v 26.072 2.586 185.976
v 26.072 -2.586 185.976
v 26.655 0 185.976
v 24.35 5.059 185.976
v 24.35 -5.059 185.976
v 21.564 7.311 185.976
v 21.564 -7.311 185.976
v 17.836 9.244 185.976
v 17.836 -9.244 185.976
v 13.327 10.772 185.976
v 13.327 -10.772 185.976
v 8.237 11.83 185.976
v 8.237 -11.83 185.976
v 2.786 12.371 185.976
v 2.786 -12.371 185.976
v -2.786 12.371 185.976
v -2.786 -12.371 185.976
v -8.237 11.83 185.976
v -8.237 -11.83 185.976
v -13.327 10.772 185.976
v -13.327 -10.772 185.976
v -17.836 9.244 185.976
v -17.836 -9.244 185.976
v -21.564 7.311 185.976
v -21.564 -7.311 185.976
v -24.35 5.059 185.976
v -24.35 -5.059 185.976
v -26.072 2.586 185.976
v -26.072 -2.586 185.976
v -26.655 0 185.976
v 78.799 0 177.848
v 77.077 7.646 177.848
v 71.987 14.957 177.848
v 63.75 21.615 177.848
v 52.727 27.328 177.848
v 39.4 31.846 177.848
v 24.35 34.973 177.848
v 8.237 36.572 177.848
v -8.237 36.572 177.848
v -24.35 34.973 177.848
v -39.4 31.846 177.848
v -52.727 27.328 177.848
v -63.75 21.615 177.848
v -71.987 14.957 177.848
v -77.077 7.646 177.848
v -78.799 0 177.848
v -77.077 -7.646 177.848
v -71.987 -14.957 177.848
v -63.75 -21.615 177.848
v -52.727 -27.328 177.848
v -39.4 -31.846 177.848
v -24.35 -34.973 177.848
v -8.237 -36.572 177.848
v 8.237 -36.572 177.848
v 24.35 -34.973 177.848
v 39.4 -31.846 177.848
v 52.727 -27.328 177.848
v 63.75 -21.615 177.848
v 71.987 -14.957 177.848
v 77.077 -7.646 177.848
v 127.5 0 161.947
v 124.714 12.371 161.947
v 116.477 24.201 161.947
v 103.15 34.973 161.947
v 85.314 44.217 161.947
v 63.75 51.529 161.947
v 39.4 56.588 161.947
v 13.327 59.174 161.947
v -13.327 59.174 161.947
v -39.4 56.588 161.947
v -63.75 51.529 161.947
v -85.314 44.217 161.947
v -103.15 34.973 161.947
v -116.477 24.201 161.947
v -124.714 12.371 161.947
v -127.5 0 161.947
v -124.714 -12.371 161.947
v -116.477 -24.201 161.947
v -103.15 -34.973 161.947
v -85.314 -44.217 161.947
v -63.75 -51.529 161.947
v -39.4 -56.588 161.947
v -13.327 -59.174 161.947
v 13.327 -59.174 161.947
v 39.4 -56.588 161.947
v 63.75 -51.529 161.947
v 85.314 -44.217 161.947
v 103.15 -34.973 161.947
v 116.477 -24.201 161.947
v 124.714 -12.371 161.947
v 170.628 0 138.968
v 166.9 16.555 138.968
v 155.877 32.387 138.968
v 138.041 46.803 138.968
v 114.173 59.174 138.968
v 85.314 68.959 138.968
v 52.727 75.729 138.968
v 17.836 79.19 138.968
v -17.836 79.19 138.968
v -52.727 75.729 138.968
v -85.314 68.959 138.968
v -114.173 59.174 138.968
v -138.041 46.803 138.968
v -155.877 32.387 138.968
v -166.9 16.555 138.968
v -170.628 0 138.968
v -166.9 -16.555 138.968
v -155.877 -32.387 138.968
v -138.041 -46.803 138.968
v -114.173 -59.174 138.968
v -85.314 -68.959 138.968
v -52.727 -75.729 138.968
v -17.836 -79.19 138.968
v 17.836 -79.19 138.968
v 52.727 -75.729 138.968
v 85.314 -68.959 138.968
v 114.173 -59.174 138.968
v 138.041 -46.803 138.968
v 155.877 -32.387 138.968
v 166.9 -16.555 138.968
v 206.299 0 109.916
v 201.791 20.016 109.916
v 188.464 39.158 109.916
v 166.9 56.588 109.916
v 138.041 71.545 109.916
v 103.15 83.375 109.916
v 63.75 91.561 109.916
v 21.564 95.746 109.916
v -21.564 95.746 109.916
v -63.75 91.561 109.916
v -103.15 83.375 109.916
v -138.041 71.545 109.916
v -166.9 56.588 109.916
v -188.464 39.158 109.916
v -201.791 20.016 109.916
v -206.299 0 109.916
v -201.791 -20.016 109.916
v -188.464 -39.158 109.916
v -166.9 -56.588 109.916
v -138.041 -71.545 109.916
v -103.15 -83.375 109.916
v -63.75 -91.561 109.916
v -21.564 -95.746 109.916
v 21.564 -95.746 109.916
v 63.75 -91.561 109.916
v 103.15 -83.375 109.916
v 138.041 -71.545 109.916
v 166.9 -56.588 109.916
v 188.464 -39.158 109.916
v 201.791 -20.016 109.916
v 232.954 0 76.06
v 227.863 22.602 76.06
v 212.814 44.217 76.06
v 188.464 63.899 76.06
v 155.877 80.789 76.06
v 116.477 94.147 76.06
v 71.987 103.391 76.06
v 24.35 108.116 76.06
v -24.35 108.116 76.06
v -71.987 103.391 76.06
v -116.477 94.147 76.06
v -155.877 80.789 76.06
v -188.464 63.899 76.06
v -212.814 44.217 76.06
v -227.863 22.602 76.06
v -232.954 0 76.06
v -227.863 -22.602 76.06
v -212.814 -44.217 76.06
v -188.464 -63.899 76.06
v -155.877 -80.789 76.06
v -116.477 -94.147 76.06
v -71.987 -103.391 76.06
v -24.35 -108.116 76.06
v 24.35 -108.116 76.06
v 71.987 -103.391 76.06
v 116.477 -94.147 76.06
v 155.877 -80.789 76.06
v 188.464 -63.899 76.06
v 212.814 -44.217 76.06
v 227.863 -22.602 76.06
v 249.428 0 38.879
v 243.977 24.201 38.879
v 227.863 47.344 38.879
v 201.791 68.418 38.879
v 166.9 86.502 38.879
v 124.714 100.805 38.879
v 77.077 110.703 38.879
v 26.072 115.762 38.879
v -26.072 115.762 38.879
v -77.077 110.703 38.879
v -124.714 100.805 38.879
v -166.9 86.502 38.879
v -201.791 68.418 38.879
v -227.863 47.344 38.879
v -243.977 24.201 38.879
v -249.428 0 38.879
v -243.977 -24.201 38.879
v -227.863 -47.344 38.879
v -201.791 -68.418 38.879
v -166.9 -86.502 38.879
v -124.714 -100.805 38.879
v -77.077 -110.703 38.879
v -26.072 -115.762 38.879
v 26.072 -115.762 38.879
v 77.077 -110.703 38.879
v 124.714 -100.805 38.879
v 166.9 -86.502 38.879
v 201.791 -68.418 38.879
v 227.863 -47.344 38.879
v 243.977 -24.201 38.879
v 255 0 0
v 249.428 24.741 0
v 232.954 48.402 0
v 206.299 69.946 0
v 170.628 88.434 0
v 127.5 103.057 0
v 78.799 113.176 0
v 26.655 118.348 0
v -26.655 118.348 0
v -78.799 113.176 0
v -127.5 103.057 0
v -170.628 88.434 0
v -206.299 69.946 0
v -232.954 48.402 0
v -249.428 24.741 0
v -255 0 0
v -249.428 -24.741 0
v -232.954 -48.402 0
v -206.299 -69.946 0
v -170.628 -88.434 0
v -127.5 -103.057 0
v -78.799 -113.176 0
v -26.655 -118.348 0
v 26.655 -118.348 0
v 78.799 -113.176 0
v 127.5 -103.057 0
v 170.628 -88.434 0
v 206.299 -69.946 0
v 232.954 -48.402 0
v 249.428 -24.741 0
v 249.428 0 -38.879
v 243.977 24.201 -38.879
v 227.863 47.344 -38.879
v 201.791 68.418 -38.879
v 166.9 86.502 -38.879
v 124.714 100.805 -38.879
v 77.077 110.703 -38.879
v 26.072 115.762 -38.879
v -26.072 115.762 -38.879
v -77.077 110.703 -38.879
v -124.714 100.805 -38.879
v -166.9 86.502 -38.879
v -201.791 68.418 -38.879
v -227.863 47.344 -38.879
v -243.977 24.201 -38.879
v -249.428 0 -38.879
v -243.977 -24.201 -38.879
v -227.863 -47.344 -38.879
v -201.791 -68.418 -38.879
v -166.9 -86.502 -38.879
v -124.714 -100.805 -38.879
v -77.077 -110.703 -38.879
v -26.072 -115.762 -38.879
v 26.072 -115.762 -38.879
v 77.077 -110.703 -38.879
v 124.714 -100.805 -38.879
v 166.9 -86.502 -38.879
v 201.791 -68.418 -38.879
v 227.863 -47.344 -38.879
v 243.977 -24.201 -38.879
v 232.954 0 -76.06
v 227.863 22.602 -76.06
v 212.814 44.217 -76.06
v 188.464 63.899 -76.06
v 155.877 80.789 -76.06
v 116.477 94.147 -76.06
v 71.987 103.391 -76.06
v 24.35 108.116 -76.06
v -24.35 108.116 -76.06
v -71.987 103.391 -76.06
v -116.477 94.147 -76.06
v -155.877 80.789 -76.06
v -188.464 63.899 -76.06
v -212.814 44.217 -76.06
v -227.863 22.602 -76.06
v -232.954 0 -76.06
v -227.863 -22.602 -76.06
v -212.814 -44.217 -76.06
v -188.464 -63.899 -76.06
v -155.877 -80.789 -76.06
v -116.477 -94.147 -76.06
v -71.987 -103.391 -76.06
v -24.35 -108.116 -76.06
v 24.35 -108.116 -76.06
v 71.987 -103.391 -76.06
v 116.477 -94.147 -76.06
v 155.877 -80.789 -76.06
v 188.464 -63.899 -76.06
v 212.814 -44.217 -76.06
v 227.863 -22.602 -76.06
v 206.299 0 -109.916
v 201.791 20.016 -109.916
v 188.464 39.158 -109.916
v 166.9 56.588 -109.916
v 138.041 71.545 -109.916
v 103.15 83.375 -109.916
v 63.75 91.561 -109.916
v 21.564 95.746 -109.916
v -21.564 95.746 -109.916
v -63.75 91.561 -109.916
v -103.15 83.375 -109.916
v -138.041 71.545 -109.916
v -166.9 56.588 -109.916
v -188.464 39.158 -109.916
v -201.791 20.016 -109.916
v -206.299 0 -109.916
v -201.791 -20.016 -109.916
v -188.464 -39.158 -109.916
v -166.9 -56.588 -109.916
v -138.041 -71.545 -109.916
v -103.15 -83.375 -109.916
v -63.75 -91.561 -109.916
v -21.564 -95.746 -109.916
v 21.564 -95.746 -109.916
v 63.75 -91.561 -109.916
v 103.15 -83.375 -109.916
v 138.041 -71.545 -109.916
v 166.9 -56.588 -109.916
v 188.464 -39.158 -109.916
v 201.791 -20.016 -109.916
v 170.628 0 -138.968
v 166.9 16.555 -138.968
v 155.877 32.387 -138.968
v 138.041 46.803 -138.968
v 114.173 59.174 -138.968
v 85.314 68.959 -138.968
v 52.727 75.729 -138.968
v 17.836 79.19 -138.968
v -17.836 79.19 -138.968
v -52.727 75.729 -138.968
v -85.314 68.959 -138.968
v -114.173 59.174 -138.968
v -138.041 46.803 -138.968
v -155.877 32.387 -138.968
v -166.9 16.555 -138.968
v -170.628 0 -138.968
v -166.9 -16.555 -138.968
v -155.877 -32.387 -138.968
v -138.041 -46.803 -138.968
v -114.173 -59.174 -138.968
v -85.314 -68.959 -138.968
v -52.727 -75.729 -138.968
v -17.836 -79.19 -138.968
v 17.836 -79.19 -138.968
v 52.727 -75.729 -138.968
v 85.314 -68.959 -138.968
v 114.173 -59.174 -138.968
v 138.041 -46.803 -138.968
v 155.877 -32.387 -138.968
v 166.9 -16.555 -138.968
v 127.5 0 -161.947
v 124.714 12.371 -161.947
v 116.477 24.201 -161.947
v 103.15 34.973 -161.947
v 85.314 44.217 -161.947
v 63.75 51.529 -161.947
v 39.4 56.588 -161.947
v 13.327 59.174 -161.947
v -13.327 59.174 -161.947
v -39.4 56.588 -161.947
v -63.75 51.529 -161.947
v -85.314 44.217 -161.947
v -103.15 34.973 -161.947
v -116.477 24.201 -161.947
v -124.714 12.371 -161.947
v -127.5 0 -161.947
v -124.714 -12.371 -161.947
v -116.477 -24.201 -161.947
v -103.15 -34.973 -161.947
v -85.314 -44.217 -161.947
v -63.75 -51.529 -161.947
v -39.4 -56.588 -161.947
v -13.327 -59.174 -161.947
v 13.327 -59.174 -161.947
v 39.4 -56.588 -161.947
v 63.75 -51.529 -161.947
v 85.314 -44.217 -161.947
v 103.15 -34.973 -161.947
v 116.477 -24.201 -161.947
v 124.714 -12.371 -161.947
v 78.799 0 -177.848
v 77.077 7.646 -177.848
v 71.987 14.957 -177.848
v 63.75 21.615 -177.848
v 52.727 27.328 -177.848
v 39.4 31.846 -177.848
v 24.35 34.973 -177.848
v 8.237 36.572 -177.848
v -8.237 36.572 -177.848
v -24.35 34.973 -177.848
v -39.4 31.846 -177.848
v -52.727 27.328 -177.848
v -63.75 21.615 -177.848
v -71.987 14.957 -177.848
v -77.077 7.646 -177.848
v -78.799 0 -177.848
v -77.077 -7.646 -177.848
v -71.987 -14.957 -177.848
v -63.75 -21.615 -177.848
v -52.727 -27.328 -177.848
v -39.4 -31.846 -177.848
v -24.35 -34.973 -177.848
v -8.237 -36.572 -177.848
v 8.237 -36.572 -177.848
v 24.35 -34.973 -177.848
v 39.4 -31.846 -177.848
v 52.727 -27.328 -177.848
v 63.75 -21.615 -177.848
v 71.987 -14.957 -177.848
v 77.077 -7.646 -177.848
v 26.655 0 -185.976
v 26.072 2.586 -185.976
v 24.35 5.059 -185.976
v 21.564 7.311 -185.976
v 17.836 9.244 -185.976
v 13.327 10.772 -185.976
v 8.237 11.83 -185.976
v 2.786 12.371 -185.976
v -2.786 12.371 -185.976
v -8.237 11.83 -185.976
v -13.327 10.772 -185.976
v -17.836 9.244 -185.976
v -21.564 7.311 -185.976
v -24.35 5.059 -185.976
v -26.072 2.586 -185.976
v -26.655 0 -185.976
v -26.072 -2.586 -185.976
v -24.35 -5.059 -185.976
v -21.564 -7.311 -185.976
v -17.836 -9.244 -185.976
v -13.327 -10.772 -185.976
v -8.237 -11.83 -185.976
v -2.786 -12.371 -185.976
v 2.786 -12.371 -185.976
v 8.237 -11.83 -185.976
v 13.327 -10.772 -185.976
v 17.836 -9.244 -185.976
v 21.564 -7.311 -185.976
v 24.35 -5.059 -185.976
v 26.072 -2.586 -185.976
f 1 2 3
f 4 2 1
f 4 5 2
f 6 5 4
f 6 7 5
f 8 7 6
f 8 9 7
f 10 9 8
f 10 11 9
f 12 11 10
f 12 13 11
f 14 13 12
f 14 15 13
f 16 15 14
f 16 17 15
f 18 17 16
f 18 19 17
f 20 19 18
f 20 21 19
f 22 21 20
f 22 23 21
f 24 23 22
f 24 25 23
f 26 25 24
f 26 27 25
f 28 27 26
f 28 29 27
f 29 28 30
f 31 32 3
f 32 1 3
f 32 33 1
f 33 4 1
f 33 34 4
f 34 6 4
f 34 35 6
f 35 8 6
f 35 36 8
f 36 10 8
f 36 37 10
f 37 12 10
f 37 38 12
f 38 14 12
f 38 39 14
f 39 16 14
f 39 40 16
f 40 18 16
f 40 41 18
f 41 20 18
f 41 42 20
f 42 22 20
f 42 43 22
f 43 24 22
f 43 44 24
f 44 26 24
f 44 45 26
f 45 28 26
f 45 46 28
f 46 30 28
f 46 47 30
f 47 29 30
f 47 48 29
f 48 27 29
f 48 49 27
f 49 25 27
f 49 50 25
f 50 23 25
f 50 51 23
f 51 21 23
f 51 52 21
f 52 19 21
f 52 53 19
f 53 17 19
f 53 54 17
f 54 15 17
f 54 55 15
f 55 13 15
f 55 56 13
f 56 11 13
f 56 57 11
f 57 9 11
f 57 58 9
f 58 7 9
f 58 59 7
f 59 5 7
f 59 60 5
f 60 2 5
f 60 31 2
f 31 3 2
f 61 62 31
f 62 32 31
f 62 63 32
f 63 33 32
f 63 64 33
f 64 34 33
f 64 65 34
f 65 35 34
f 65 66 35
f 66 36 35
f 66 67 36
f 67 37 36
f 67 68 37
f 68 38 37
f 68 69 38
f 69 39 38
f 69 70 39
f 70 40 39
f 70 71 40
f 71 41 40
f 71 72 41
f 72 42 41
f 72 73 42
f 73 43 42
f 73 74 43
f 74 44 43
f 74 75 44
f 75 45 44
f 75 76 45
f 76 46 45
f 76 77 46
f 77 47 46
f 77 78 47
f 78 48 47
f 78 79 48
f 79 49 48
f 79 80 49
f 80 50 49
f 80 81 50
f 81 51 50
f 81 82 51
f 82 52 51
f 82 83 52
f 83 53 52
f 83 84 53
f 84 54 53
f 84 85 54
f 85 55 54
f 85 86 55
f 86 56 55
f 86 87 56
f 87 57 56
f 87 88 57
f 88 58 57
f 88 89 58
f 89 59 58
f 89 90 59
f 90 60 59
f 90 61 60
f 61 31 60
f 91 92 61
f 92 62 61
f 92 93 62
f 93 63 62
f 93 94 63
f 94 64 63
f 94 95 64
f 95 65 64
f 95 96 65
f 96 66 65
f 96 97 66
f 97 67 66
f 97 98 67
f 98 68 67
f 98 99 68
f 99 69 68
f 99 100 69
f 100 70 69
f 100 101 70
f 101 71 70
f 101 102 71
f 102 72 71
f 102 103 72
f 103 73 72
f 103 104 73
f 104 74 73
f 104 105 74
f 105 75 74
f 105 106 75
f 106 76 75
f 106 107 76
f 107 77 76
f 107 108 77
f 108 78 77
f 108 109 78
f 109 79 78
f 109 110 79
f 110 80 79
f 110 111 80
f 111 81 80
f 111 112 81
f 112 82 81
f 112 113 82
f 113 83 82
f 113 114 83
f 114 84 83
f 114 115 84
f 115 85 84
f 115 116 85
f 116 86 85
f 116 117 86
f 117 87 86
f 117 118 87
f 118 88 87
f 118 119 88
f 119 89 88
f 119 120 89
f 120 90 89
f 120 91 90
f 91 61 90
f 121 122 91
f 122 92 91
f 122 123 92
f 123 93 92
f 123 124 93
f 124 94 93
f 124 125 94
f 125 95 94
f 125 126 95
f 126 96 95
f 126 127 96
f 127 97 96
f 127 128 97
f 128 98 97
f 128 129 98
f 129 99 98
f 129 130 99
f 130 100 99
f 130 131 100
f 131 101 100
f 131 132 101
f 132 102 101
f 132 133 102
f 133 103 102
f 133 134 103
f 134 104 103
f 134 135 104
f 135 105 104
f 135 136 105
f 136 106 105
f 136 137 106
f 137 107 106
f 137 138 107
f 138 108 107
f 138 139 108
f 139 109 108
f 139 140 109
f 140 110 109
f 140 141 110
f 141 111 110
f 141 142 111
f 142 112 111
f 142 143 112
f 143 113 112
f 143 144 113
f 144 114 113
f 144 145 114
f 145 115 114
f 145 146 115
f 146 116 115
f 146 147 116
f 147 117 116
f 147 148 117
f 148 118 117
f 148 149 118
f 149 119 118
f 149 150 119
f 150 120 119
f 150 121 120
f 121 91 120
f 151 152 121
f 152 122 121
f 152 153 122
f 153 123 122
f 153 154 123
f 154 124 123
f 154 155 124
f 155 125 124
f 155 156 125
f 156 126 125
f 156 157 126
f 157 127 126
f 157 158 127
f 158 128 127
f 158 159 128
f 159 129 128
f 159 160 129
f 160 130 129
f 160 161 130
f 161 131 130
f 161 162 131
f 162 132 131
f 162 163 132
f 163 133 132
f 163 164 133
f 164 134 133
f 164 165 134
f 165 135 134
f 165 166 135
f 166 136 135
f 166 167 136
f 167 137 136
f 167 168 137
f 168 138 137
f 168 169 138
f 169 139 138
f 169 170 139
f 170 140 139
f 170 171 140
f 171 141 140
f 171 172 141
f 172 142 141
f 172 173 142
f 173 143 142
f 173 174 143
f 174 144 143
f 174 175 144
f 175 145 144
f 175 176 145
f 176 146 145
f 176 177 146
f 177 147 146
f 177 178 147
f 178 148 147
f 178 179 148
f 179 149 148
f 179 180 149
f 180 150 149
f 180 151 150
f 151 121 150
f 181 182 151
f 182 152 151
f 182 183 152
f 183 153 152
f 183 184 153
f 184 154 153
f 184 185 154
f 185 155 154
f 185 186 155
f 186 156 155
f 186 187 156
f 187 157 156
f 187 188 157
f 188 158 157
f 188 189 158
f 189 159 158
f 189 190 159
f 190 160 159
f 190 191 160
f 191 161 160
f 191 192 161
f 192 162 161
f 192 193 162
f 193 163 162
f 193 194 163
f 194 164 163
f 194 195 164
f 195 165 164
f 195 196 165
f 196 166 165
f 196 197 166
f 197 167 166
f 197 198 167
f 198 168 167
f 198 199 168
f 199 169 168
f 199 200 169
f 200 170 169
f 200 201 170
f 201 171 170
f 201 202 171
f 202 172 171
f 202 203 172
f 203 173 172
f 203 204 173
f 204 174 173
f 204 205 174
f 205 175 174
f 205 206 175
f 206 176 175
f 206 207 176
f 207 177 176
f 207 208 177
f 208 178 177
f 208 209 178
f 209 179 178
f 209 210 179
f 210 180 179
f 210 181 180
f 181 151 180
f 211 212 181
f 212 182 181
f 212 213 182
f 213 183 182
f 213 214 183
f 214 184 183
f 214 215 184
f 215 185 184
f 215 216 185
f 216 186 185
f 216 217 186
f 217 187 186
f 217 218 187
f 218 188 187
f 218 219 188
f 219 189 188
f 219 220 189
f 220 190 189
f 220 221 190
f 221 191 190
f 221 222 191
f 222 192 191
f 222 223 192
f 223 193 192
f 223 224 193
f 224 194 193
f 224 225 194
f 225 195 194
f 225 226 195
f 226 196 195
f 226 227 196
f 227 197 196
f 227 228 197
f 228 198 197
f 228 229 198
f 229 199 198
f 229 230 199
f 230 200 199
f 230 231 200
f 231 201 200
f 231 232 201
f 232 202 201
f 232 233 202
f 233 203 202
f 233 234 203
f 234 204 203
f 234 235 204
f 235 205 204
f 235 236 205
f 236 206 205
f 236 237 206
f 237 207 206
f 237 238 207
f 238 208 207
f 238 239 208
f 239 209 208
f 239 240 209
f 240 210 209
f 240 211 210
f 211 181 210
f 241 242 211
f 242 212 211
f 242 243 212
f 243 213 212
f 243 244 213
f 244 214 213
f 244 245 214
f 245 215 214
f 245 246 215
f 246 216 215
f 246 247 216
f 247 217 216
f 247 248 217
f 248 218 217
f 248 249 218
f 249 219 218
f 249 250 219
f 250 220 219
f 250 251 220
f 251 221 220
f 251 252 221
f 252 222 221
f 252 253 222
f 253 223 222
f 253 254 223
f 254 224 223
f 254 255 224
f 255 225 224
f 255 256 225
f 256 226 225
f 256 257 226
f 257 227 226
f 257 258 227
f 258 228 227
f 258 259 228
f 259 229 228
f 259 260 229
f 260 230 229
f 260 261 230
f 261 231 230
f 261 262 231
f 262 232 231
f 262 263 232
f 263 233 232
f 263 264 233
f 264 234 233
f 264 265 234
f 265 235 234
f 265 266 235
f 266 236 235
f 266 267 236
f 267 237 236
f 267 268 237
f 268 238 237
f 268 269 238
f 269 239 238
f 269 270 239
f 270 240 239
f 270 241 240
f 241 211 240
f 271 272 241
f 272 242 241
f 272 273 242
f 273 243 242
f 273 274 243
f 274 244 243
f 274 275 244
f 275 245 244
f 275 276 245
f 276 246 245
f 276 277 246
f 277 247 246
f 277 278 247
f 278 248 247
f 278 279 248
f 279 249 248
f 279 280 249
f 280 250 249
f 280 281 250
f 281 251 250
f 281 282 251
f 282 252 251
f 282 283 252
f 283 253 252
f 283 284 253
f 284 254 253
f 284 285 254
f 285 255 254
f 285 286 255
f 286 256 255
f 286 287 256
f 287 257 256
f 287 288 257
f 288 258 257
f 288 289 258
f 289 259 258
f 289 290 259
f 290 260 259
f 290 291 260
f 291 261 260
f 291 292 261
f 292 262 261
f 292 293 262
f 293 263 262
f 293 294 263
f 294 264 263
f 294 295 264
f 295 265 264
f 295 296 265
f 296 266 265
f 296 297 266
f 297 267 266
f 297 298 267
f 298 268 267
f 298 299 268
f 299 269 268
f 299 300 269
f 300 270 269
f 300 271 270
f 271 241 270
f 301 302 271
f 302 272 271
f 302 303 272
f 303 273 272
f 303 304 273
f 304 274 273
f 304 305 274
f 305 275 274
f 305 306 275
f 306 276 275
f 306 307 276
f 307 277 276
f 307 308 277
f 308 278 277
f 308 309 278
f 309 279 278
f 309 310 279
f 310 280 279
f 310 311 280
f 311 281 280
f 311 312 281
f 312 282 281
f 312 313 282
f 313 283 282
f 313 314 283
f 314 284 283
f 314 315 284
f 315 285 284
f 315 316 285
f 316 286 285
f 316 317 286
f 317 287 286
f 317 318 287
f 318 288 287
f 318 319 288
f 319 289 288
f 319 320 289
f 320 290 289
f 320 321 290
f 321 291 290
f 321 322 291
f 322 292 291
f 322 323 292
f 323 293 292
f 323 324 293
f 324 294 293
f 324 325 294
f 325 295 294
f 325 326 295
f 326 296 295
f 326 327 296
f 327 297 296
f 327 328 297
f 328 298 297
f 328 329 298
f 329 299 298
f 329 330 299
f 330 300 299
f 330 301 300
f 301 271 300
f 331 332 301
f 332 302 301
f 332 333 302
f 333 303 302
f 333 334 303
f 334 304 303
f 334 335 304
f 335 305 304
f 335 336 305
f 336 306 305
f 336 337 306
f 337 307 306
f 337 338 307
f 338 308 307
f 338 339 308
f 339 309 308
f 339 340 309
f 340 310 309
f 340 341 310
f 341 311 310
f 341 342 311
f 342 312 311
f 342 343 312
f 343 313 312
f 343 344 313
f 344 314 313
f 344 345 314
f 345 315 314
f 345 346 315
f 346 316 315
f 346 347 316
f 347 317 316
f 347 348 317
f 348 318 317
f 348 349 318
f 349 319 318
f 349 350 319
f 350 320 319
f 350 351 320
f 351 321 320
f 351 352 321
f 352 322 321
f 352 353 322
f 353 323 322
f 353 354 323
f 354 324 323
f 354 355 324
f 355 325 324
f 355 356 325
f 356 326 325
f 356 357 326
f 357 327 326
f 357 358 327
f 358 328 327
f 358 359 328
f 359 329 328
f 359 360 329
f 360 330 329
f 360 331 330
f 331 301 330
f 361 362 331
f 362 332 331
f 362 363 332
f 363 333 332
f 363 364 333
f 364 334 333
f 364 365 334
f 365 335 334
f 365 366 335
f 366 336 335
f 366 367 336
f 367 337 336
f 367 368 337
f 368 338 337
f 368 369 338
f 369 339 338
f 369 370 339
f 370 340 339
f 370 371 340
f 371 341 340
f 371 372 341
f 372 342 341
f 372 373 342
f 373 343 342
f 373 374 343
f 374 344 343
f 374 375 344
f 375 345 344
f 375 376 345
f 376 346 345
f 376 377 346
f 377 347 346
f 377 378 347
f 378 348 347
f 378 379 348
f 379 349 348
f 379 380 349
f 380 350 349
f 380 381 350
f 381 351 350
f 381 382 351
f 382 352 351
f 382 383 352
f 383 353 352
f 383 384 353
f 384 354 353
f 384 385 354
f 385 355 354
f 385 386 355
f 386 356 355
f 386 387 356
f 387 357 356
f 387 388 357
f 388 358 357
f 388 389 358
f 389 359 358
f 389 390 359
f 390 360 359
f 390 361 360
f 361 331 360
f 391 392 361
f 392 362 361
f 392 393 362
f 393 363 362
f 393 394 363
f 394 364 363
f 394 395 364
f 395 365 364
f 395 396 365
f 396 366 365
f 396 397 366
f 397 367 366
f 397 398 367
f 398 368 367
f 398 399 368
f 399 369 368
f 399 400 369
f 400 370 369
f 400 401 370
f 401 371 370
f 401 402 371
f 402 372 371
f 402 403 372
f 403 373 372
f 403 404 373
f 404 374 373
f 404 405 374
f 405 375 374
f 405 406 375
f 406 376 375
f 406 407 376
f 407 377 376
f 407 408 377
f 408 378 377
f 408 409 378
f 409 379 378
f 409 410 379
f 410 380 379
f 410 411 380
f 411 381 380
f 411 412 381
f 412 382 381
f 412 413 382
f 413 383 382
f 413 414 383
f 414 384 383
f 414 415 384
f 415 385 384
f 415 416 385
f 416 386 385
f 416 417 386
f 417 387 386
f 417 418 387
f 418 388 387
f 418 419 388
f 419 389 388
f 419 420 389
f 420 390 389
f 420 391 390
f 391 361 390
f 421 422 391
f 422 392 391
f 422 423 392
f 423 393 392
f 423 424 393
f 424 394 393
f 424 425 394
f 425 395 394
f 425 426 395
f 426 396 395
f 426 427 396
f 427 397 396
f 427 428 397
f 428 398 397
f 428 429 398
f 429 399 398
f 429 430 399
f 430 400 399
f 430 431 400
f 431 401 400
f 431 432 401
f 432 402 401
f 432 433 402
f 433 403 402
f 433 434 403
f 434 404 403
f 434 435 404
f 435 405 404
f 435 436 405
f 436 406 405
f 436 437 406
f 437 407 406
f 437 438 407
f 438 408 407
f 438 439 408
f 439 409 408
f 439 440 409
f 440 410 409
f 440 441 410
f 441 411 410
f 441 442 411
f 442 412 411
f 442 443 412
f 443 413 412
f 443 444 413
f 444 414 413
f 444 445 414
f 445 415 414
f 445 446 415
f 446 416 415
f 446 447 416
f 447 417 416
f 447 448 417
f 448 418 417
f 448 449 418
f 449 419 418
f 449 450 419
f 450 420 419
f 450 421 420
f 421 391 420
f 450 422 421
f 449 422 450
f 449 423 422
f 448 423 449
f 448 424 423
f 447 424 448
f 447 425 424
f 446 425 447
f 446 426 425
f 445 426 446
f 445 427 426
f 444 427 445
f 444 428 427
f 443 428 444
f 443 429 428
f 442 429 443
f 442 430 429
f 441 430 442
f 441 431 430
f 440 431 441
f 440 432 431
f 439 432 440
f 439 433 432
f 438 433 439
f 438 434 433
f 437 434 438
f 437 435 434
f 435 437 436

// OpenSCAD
// Generated by SolidPython 1.0.1 on 2020-07-29 00:46:51


scale(v = [15, 7, 11]) {
	sphere(r = 17);
}
/***********************************************
*********      SolidPython code:      **********
************************************************
 
# import packages: SolidPython
from solid import *
from solid.utils import *
from itertools import chain, combinations, permutations


class Resize:

    def __init__(self, scad_file):
        self.scad_file = scad_file
        #self.scad_file = import_scad(scad_file)
        # cone/cylinder param:
        self.r1 = 0
        self.r2 = 0
        self.h = 0
        # rectangular prism param:
        self.w = 0
        self.l = 0
        # ellipse param:
        self.r = 0

    # import OpenScad code (file name corresponds to shape)


    # classify shape + parameters
    def assign(self, param1, param2, param3):
        if self.scad_file == 'cone.scad':
            self.r1 = param1
            self.r2 = param2
            self.h = param3
        elif self.scad_file == 'cylinder.scad':
            self.r1 = param1
            self.r2 = param2
            self.h = param3
        elif self.scad_file == 'rectangularPrism.scad':
            self.h = param1
            self.l = param2
            self.w = param3
        else:
            self.r = param1
            self.h = param2

    # resize parameters
    def iterate(self):
        x = range(3, 20, 2)
        i = 1
        if self.scad_file == 'cone.scad':
            tempList = list(permutations(x, 2))
            for temp in tempList:
                param1 = temp[0]
                param2 = temp[1]
                filepath = 'produced_scad_files/' + 'cone' + str(param1) + '_' + str(param2) + '_' + '.scad'
                scad_render_to_file(cylinder(h=param1, r1=param2, r2=0), filepath)

        elif self.scad_file == 'cylinder.scad':
            tempList = list(permutations(x, 3))
            for temp in tempList:
                param1 = temp[0]
                param2 = temp[1]
                filepath = 'produced_scad_files/' + 'cylinder' + str(param1) + '_' + str(param2) + '_' + '.scad'
                scad_render_to_file(cylinder(h=param1, r1=param2, r2=param2), filepath)

        elif self.scad_file == 'rectangularPrism.scad':
            tempList = list(permutations(x, 3))
            for temp in tempList:
                param1 = temp[0]
                param2 = temp[1]
                param3 = temp[2]
                filepath = 'produced_scad_files/' + 'rectangularPrism' + str(param1) + '_' + str(param2) + '_' + str(
                    param3) + '.scad'
                scad_render_to_file(cube(size=(param1, param2, param3)), filepath)

        elif self.scad_file == 'ellipse.scad':
            tempList = list(permutations(x, 4))
            for temp in tempList:
                param1 = temp[0]
                param2 = temp[1]
                param3 = temp[2]
                param4 = temp[3]
                filepath = 'produced_scad_files/' + 'ellipse' + str(param1) + '_' + str(param2) + '_' + str(param3) + '_' + str(param4) + '.scad'
                scad_render_to_file(scale([param1, param2, param3])(sphere(r=param4)), filepath)

    def render_to_scadfile(self):
        scad_render_to_file(scad, 'example.scad') 
 
************************************************/
